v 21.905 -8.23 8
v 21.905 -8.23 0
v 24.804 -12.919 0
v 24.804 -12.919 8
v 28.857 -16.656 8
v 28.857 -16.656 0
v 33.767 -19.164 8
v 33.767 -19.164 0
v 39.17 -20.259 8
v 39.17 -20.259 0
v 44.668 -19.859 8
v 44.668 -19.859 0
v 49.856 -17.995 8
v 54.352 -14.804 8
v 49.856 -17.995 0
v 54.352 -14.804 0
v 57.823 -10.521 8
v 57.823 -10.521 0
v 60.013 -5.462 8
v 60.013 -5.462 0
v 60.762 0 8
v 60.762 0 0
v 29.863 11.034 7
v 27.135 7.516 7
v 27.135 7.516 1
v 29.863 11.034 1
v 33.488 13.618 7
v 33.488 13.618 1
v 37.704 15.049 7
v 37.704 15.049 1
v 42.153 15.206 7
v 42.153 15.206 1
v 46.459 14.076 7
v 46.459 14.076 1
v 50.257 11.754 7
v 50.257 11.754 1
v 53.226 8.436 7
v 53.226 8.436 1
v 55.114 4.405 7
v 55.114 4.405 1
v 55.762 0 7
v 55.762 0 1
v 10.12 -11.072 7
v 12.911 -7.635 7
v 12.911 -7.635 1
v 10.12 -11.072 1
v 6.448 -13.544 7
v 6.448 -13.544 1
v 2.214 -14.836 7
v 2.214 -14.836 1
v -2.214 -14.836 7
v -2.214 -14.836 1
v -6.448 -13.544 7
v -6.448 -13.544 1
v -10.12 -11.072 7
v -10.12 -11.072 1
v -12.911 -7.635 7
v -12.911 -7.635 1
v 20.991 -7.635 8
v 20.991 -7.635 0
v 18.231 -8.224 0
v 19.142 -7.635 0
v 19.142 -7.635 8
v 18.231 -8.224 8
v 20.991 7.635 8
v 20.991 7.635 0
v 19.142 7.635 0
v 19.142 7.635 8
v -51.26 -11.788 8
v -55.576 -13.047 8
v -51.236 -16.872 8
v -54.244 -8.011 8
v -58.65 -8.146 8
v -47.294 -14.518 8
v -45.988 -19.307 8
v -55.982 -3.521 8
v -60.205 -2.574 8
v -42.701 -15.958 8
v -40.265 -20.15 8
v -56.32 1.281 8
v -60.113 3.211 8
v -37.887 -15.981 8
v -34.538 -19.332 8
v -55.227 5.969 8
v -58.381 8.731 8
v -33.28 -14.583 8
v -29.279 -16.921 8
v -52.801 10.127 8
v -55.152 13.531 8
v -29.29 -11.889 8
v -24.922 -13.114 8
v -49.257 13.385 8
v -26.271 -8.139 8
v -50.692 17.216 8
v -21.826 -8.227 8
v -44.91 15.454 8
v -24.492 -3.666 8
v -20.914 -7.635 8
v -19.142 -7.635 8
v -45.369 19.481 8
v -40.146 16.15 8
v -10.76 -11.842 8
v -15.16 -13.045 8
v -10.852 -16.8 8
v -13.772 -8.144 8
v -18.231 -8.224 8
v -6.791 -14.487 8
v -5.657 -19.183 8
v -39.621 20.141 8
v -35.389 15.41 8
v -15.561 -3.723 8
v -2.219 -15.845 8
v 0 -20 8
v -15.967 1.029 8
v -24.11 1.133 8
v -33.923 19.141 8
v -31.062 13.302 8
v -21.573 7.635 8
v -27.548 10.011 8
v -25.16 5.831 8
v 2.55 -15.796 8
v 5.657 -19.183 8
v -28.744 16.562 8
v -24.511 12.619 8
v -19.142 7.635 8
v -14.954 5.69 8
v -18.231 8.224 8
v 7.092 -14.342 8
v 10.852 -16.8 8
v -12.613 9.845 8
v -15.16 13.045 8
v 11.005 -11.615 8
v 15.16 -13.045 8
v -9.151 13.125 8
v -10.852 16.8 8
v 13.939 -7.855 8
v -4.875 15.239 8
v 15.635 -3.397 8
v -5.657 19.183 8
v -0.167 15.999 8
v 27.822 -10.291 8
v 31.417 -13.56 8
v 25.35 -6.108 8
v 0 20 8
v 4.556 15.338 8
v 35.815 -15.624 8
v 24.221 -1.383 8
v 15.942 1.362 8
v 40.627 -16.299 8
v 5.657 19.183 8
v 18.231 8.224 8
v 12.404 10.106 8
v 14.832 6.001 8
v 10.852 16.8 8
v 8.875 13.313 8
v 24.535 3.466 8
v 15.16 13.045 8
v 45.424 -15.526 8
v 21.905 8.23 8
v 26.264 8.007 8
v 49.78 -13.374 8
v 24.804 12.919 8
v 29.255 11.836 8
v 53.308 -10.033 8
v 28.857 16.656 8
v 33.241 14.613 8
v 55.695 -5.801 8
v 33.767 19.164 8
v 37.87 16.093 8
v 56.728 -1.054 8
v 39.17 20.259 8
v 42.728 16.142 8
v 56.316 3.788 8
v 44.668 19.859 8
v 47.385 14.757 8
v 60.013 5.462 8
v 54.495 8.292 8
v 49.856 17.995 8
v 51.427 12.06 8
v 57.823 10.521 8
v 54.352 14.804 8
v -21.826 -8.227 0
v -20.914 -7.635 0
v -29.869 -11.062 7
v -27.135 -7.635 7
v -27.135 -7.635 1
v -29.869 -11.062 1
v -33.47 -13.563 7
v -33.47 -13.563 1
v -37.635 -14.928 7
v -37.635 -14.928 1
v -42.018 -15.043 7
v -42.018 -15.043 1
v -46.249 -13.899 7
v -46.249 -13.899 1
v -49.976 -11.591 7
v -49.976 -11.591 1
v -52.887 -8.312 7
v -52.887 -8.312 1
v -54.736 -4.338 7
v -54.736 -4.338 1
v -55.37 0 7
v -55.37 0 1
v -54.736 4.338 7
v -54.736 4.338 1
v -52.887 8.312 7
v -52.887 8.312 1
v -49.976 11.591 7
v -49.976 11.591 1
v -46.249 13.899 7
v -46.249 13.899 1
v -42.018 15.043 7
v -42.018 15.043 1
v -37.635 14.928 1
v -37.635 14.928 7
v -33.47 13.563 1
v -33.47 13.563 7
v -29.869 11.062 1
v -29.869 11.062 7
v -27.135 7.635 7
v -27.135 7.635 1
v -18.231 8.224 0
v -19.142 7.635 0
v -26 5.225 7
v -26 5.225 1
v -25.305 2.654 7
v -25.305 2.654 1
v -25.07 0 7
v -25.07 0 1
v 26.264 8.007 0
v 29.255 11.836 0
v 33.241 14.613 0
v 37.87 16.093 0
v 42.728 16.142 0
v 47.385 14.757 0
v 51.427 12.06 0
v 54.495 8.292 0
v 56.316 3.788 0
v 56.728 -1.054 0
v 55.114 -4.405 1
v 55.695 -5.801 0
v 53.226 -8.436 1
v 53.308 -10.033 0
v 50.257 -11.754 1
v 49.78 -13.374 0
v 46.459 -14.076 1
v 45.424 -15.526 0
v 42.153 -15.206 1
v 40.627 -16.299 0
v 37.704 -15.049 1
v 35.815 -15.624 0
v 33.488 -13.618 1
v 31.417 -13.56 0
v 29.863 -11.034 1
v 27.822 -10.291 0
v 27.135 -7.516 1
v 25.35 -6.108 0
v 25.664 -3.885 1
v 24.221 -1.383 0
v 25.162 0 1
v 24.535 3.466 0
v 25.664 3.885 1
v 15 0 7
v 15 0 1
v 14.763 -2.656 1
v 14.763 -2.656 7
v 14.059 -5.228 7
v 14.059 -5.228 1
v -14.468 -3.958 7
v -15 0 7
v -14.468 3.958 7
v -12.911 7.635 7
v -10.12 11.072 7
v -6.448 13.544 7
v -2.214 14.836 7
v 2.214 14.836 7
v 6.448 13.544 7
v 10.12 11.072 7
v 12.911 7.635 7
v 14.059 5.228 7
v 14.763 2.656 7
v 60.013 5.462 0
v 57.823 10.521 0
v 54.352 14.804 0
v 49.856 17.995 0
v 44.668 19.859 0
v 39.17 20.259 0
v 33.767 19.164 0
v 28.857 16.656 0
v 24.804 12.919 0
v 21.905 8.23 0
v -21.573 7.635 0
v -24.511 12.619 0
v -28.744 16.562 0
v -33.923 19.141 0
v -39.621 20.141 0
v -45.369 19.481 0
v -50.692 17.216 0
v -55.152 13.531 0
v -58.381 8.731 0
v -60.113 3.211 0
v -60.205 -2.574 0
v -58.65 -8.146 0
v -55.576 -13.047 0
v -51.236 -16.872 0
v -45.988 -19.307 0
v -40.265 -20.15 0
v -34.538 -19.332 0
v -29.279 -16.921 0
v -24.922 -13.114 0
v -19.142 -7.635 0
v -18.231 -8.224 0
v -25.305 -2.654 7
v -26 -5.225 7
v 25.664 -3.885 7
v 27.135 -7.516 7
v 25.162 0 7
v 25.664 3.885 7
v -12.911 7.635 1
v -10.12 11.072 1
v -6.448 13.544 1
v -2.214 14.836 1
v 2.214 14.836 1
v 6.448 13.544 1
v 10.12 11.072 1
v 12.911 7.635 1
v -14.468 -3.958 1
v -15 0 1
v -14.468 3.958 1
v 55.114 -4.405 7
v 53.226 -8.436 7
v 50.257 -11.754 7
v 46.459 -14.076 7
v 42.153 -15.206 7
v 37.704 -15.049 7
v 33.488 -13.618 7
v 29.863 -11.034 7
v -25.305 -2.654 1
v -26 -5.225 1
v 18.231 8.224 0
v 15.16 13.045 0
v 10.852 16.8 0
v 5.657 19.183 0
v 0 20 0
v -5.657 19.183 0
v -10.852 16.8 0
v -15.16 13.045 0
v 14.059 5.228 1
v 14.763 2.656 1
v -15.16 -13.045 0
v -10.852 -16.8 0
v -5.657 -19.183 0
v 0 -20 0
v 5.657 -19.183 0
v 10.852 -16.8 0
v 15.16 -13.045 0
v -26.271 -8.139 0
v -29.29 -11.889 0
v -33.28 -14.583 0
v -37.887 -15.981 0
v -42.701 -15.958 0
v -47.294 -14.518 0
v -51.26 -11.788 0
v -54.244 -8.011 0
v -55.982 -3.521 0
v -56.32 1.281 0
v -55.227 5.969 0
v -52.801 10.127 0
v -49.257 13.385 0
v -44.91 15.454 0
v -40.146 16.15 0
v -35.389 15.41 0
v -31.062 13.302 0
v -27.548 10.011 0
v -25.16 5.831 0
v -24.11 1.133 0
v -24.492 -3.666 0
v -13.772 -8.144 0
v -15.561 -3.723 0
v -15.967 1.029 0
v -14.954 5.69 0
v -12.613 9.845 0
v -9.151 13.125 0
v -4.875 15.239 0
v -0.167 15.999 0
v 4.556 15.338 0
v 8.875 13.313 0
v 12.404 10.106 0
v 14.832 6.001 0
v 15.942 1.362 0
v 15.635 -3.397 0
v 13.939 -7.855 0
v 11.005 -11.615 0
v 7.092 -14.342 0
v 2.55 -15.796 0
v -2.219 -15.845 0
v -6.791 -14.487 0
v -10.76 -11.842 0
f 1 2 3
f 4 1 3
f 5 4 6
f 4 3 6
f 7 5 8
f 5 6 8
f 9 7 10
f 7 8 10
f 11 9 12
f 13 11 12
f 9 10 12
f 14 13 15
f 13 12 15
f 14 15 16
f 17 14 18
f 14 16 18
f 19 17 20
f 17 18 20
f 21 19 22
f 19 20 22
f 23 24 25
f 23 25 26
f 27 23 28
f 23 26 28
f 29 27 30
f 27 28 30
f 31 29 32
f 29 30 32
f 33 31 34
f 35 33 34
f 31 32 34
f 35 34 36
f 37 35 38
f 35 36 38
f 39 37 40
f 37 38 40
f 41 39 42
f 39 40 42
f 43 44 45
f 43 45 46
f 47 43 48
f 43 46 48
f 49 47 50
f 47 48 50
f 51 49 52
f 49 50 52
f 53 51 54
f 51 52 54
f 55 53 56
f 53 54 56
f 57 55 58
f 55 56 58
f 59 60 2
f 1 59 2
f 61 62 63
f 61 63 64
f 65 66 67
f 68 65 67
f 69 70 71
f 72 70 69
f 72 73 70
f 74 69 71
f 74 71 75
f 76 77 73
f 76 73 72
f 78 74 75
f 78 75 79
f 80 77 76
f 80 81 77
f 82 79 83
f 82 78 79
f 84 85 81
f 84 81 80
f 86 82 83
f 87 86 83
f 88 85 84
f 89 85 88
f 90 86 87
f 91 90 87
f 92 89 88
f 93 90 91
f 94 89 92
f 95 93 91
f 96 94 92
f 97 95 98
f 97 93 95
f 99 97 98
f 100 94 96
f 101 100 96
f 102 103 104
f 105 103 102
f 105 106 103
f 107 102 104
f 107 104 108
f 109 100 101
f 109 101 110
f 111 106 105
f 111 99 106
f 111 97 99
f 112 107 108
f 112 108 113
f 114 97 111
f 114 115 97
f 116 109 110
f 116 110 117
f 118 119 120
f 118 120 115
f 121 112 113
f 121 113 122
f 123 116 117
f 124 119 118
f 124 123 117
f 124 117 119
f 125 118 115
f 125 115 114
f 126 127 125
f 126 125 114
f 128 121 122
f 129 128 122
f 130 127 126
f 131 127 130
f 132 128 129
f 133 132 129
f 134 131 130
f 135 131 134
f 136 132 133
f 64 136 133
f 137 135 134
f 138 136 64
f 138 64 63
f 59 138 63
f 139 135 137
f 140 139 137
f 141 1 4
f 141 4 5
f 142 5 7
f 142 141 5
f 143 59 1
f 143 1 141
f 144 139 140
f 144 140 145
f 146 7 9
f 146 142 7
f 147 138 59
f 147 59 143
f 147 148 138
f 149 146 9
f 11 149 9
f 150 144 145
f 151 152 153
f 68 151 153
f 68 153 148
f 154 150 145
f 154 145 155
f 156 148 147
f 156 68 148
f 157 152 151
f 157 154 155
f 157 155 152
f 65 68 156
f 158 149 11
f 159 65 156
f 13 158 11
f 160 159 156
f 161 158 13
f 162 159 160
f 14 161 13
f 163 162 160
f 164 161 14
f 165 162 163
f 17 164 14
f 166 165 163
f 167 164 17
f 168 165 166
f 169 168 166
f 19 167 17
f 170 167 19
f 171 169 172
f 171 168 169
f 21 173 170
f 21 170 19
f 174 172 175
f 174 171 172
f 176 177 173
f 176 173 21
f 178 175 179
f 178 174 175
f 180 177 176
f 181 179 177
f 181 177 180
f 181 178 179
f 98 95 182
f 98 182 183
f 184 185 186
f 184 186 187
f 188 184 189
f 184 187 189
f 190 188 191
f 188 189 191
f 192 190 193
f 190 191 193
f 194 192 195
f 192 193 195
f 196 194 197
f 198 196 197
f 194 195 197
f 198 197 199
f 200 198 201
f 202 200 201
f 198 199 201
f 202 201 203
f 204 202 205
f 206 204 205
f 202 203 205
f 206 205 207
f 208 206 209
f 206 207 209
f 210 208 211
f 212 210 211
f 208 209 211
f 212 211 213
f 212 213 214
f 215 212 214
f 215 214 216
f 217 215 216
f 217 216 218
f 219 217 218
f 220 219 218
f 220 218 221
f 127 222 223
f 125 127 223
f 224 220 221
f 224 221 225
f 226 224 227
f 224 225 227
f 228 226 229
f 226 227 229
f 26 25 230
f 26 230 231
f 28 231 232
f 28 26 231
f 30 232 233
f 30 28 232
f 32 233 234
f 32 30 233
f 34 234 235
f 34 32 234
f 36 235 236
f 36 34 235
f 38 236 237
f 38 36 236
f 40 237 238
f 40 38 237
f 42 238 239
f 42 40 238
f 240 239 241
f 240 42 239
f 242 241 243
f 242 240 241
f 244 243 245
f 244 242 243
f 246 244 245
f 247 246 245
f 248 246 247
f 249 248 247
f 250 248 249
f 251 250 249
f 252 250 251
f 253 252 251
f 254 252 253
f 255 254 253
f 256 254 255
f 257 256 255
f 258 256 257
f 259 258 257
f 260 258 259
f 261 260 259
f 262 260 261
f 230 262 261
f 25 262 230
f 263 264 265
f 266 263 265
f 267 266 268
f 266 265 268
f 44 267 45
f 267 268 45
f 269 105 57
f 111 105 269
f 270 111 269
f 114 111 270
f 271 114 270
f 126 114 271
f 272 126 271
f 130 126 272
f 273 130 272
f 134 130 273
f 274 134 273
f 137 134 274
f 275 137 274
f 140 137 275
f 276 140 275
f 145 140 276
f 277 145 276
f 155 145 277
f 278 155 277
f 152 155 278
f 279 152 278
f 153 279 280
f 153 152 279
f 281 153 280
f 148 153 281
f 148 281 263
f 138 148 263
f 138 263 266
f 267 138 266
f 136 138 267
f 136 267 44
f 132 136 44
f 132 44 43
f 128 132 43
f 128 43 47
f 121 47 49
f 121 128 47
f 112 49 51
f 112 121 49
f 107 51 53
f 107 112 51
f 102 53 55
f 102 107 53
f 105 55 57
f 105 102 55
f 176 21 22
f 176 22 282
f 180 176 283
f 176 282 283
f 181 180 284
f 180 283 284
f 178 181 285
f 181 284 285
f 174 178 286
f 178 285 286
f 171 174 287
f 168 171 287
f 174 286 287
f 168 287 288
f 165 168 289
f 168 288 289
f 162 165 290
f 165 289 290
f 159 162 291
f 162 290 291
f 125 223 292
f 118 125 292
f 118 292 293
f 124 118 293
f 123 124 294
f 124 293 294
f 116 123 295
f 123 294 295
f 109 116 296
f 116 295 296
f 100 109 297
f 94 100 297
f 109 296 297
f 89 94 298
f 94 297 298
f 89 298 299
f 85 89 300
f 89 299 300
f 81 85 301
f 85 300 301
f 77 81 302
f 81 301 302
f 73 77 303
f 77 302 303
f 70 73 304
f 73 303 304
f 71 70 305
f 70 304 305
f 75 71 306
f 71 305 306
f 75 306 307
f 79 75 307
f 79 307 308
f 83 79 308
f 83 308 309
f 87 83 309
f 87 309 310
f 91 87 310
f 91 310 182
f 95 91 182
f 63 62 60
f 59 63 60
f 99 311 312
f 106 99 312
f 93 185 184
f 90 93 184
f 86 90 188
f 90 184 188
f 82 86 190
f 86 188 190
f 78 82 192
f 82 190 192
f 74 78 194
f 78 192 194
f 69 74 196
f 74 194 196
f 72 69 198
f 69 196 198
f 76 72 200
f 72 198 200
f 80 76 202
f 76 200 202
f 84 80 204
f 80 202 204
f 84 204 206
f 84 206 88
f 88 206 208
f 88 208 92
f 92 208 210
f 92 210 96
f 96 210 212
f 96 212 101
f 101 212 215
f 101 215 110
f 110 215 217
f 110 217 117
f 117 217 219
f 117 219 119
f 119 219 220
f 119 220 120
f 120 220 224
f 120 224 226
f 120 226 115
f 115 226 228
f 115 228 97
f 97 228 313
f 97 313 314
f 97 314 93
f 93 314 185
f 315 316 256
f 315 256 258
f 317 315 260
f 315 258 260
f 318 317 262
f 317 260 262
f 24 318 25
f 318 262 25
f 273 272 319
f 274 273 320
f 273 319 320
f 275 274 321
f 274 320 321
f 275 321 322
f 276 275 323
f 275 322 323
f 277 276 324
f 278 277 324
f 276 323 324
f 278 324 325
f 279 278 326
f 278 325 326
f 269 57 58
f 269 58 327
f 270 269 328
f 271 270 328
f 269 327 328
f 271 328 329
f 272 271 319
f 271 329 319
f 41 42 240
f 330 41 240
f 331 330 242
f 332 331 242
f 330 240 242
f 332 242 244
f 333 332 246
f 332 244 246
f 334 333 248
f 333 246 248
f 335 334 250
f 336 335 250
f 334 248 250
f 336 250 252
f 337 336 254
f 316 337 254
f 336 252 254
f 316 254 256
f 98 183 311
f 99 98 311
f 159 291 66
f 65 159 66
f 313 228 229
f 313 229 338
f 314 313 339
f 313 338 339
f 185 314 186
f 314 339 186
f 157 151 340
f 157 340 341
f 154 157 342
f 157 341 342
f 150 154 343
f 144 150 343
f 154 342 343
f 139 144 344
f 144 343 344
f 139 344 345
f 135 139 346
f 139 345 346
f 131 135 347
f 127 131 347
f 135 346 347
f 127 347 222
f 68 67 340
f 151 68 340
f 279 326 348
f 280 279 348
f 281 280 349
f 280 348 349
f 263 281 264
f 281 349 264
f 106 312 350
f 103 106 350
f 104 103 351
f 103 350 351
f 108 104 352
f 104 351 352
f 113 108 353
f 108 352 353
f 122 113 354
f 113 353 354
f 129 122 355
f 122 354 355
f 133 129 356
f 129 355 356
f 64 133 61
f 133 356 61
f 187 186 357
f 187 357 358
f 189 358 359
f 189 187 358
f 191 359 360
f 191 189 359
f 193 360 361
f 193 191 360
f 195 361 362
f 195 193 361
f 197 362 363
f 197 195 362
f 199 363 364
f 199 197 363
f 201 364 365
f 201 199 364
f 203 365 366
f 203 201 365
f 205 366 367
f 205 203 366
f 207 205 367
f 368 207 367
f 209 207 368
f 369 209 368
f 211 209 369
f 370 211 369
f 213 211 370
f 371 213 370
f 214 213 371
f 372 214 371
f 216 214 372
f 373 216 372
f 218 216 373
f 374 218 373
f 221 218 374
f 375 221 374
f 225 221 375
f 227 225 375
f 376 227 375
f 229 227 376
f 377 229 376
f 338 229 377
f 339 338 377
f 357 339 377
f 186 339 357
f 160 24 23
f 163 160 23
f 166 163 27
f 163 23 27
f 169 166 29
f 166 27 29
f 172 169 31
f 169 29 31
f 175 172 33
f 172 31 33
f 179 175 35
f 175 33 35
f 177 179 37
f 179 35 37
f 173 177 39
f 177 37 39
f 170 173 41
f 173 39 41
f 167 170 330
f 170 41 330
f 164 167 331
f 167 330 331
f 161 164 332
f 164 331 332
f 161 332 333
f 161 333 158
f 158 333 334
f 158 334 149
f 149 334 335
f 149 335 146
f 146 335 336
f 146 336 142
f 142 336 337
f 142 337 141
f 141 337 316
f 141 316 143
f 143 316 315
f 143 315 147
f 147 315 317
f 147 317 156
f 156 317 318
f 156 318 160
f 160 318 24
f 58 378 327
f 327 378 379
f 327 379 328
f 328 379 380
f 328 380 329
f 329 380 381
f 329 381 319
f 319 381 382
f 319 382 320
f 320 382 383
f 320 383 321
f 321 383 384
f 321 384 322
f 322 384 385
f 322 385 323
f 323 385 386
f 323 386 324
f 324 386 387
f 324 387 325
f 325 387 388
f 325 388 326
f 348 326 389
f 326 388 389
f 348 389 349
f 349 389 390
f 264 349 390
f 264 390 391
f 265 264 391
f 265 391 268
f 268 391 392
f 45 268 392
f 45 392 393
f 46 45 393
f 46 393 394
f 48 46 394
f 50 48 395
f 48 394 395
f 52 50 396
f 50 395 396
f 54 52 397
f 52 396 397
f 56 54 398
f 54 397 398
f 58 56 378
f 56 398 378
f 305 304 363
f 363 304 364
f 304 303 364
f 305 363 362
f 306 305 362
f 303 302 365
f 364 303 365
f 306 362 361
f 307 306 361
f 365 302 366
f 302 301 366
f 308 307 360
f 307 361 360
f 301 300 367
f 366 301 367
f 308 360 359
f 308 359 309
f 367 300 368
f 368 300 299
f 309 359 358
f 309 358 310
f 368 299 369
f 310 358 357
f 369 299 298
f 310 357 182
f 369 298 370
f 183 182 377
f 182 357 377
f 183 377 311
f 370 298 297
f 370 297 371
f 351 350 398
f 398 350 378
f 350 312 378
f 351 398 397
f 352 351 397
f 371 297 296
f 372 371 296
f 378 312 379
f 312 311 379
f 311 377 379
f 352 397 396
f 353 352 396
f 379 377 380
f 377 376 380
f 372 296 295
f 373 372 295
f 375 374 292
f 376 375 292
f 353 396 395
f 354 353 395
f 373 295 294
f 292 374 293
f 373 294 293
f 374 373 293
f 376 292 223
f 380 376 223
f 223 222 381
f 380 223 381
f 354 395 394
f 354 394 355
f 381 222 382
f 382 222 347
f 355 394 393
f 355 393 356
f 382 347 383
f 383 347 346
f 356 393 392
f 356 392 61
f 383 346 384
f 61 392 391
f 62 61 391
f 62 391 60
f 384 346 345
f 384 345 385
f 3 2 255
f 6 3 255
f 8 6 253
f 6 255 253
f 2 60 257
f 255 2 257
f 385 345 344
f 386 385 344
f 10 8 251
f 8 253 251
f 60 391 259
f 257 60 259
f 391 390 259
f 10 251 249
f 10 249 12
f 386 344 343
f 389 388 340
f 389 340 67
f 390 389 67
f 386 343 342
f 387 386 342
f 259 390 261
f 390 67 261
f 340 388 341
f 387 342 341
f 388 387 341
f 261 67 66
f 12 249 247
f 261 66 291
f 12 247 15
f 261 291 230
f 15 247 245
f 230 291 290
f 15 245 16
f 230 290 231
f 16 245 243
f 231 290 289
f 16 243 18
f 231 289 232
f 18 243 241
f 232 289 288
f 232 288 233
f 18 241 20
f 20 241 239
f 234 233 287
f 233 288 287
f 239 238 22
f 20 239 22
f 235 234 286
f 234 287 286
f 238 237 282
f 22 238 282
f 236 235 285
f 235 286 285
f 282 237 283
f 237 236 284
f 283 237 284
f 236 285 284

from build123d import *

# Parameters (mm, degrees)
F1_DEPTH    = 8
F2_T1_DEPTH = 8


# Not quite as in the source:
# - a fillet or chamfer that OpenCascade refuses, or shapes differently, is made with other operations: its cross-section is extruded or revolved along the edge and cut away or added


with BuildPart() as f1:
    # F0 (on Top) → F1 (new body)
    with BuildSketch(Plane.XY):
        with BuildLine():
            ThreePointArc((12.9113873807, 7.6351866975), (14.4684278813, 3.9578522768), (15, 0))
            ThreePointArc((15, 0), (14.4684278813, -3.9578522768), (12.9113873807, -7.6351866975))
            Line((12.9113873807, -7.6351866975), (18.4852353, -7.6351866975))
            ThreePointArc((18.4852353, -7.6351866975), (19.6176541156, -3.8919978161), (20, 0))
            ThreePointArc((20, 0), (19.6176541156, 3.8919978161), (18.4852353, 7.6351866975))
            Line((18.4852353, 7.6351866975), (12.9113873807, 7.6351866975))
        make_face()
        with BuildLine():
            ThreePointArc((-12.9113873807, 7.6351866975), (0, 15), (12.9113873807, 7.6351866975))
            Line((12.9113873807, 7.6351866975), (18.4852353, 7.6351866975))
            ThreePointArc((18.4852353, 7.6351866975), (0, 20), (-18.4852353, 7.6351866975))
            Line((-18.4852353, 7.6351866975), (-12.9113873807, 7.6351866975))
        make_face()
        with BuildLine():
            Line((18.4852353, -7.6351866975), (12.9113873807, -7.6351866975))
            ThreePointArc((12.9113873807, -7.6351866975), (0, -15), (-12.9113873807, -7.6351866975))
            Line((-12.9113873807, -7.6351866975), (-18.4852353, -7.6351866975))
            ThreePointArc((-18.4852353, -7.6351866975), (0, -20), (18.4852353, -7.6351866975))
        make_face()
        with BuildLine():
            ThreePointArc((-12.9113873807, -7.6351866975), (-15, 0), (-12.9113873807, 7.6351866975))
            Line((-12.9113873807, 7.6351866975), (-18.4852353, 7.6351866975))
            ThreePointArc((-18.4852353, 7.6351866975), (-20, 0), (-18.4852353, -7.6351866975))
            Line((-18.4852353, -7.6351866975), (-12.9113873807, -7.6351866975))
        make_face()
        with BuildLine():
            Line((21.6526307541, 7.6351866975), (18.4852353, 7.6351866975))
            ThreePointArc((18.4852353, 7.6351866975), (19.6176541156, 3.8919978161), (20, 0))
            ThreePointArc((20, 0), (19.6176541156, -3.8919978161), (18.4852353, -7.6351866975))
            Line((18.4852353, -7.6351866975), (21.6526307541, -7.6351866975))
            ThreePointArc((21.6526307541, -7.6351866975), (20.1620412737, 0), (21.6526307541, 7.6351866975))
        make_face()
        with BuildLine():
            ThreePointArc((-18.4852353, -7.6351866975), (-20, 0), (-18.4852353, 7.6351866975))
            Line((-18.4852353, 7.6351866975), (-21.5730507637, 7.6351866975))
            ThreePointArc((-21.5730507637, 7.6351866975), (-20.4496870957, 3.8908164426), (-20.0704748243, 0))
            ThreePointArc((-20.0704748243, 0), (-20.4496870957, -3.8908164426), (-21.5730507637, -7.6351866975))
            Line((-21.5730507637, -7.6351866975), (-18.4852353, -7.6351866975))
        make_face()
        with BuildLine():
            Line((27.135123316, 7.6351866975), (21.6526307541, 7.6351866975))
            ThreePointArc((21.6526307541, 7.6351866975), (20.1620412737, 0), (21.6526307541, -7.6351866975))
            Line((21.6526307541, -7.6351866975), (27.135123316, -7.6351866975))
            Line((27.135123316, -7.6351866975), (27.135123316, -7.5155344287))
            ThreePointArc((27.135123316, -7.5155344287), (25.1620412737, 0), (27.135123316, 7.5155344287))
            Line((27.135123316, 7.5155344287), (27.135123316, 7.6351866975))
        make_face()
        with BuildLine():
            ThreePointArc((60.7620412737, 0), (44.3517049129, 19.9238680174), (21.6526307541, 7.6351866975))
            Line((21.6526307541, 7.6351866975), (27.135123316, 7.6351866975))
            Line((27.135123316, 7.6351866975), (27.135123316, 7.5155344287))
            ThreePointArc((27.135123316, 7.5155344287), (44.347151005, 14.7985108162), (55.7620412737, 0))
            ThreePointArc((55.7620412737, 0), (44.347151005, -14.7985108162), (27.135123316, -7.5155344287))
            Line((27.135123316, -7.5155344287), (27.135123316, -7.6351866975))
            Line((27.135123316, -7.6351866975), (21.6526307541, -7.6351866975))
            ThreePointArc((21.6526307541, -7.6351866975), (44.3517049129, -19.9238680174), (60.7620412737, 0))
        make_face()
        with BuildLine():
            Line((-27.135123316, 7.6351866975), (-21.5730507637, 7.6351866975))
            ThreePointArc((-21.5730507637, 7.6351866975), (-60.3704748243, 0), (-21.5730507637, -7.6351866975))
            Line((-21.5730507637, -7.6351866975), (-27.135123316, -7.6351866975))
            ThreePointArc((-27.135123316, -7.6351866975), (-55.3704748243, 0), (-27.135123316, 7.6351866975))
        make_face()
        with BuildLine():
            ThreePointArc((-20.0704748243, 0), (-20.4496870957, 3.8908164426), (-21.5730507637, 7.6351866975))
            Line((-21.5730507637, 7.6351866975), (-27.135123316, 7.6351866975))
            ThreePointArc((-27.135123316, 7.6351866975), (-25.5957427695, 3.9547076156), (-25.0704748243, 0))
            ThreePointArc((-25.0704748243, 0), (-25.5957427695, -3.9547076156), (-27.135123316, -7.6351866975))
            Line((-27.135123316, -7.6351866975), (-21.5730507637, -7.6351866975))
            ThreePointArc((-21.5730507637, -7.6351866975), (-20.4496870957, -3.8908164426), (-20.0704748243, 0))
        make_face()
    extrude(amount=F1_DEPTH)

    # F2: chamfer of 1 on 13 edges, made by hand

    # F2_s2 → F2_t1 (join)
    with BuildSketch(Plane.XY):
        with BuildLine():
            Line((20.9909460118, -7.6351866975), (21.9050819396, -8.2297788713))
            ThreePointArc((21.9050819396, -8.2297788713), (21.7829852925, -7.9487651651), (21.6526307541, -7.6351866975))
            Line((21.6526307541, -7.6351866975), (20.9909460118, -7.6351866975))
        make_face()
        with BuildLine():
            Line((-19.1424541452, -7.6351866975), (-18.2309087097, -8.2239873309))
            ThreePointArc((-18.2309087097, -8.2239873309), (-18.3538297184, -7.9458753243), (-18.4852353, -7.6351866975))
            Line((-18.4852353, -7.6351866975), (-19.1424541452, -7.6351866975))
        make_face()
        with BuildLine():
            Line((21.9050819396, 8.2297788713), (20.9909460118, 7.6351866975))
            Line((20.9909460118, 7.6351866975), (21.6526307541, 7.6351866975))
            ThreePointArc((21.6526307541, 7.6351866975), (21.7829852925, 7.9487651651), (21.9050819396, 8.2297788713))
        make_face()
        with BuildLine():
            Line((-18.2309087097, 8.2239873309), (-19.1424541452, 7.6351866975))
            Line((-19.1424541452, 7.6351866975), (-18.4852353, 7.6351866975))
            ThreePointArc((-18.4852353, 7.6351866975), (-18.3538297184, 7.9458753243), (-18.2309087097, 8.2239873309))
        make_face()
        with BuildLine():
            Line((19.1424541452, 7.6351866975), (18.2309087097, 8.2239873309))
            ThreePointArc((18.2309087097, 8.2239873309), (18.3538297184, 7.9458753243), (18.4852353, 7.6351866975))
            Line((18.4852353, 7.6351866975), (19.1424541452, 7.6351866975))
        make_face()
        with BuildLine():
            Line((19.1424541452, -7.6351866975), (18.2309087097, -8.2239873309))
            ThreePointArc((18.2309087097, -8.2239873309), (18.3538297184, -7.9458753243), (18.4852353, -7.6351866975))
            Line((18.4852353, -7.6351866975), (19.1424541452, -7.6351866975))
        make_face()
        with BuildLine():
            Line((-21.8264389289, -8.2269036385), (-20.9135835494, -7.6351866975))
            Line((-20.9135835494, -7.6351866975), (-21.5730507637, -7.6351866975))
            ThreePointArc((-21.5730507637, -7.6351866975), (-21.703929906, -7.9473306392), (-21.8264389289, -8.2269036385))
        make_face()
    extrude(amount=F2_T1_DEPTH)

    # F2_s3 → F2_t4 (revolve, cut)
    with BuildSketch(Plane(origin=(-10.2155381424, -17.5076147757, 0), x_dir=(0, 0, 1), z_dir=(0.5039727193, 0.8637195715, 0))):
        Polygon((8, -18.5892112809), (7, -19.5892112809), (8, -19.5892112809), align=None)
    revolve(axis=Axis((-40.2204748243, 0, 8), (0, 0, -1)), mode=Mode.SUBTRACT)

    # F2_s5 → F2_t6 (revolve, cut)
    with BuildSketch(Plane(origin=(0, 0, 0), x_dir=(0, 0, 1), z_dir=(0.5090124465, -0.8607591587, 0))):
        Polygon((7, 15), (8, 16), (8, 15), align=None)
    revolve(axis=Axis((0, 0, 8), (0, 0, -1)), mode=Mode.SUBTRACT)

    # F2_s7 → F2_t8 (revolve, cut)
    with BuildSketch(Plane(origin=(9.7630309126, 17.3122900606, 0), x_dir=(0, 0, 1), z_dir=(-0.4912114006, -0.8710403894, 0))):
        Polygon((8, -18.9440721866), (7, -19.9440721866), (8, -19.9440721866), align=None)
    revolve(axis=Axis((40.4620412737, 0, 8), (0, 0, -1)), mode=Mode.SUBTRACT)

    # F2_s9 → F2_t10 (revolve, cut)
    with BuildSketch(Plane(origin=(-10.2155381424, -17.5076147757, 0), x_dir=(0, 0, 1), z_dir=(0.5039727193, 0.8637195715, 0))):
        Polygon((0, -18.5892112809), (1, -19.5892112809), (0, -19.5892112809), align=None)
    revolve(axis=Axis((-40.2204748243, 0, 0), (0, 0, -1)), mode=Mode.SUBTRACT)

    # F2_s11 → F2_t12 (revolve, cut)
    with BuildSketch(Plane(origin=(0, 0, 0), x_dir=(0, 0, 1), z_dir=(0.5090124465, -0.8607591587, 0))):
        Polygon((1, 15), (0, 16), (0, 15), align=None)
    revolve(axis=Axis((0, 0, 0), (0, 0, -1)), mode=Mode.SUBTRACT)

    # F2_s13 → F2_t14 (revolve, cut)
    with BuildSketch(Plane(origin=(9.7630309126, 17.3122900606, 0), x_dir=(0, 0, 1), z_dir=(-0.4912114006, -0.8710403894, 0))):
        Polygon((0, -18.9440721866), (1, -19.9440721866), (0, -19.9440721866), align=None)
    revolve(axis=Axis((40.4620412737, 0, 0), (0, 0, -1)), mode=Mode.SUBTRACT)


solid = f1.part
